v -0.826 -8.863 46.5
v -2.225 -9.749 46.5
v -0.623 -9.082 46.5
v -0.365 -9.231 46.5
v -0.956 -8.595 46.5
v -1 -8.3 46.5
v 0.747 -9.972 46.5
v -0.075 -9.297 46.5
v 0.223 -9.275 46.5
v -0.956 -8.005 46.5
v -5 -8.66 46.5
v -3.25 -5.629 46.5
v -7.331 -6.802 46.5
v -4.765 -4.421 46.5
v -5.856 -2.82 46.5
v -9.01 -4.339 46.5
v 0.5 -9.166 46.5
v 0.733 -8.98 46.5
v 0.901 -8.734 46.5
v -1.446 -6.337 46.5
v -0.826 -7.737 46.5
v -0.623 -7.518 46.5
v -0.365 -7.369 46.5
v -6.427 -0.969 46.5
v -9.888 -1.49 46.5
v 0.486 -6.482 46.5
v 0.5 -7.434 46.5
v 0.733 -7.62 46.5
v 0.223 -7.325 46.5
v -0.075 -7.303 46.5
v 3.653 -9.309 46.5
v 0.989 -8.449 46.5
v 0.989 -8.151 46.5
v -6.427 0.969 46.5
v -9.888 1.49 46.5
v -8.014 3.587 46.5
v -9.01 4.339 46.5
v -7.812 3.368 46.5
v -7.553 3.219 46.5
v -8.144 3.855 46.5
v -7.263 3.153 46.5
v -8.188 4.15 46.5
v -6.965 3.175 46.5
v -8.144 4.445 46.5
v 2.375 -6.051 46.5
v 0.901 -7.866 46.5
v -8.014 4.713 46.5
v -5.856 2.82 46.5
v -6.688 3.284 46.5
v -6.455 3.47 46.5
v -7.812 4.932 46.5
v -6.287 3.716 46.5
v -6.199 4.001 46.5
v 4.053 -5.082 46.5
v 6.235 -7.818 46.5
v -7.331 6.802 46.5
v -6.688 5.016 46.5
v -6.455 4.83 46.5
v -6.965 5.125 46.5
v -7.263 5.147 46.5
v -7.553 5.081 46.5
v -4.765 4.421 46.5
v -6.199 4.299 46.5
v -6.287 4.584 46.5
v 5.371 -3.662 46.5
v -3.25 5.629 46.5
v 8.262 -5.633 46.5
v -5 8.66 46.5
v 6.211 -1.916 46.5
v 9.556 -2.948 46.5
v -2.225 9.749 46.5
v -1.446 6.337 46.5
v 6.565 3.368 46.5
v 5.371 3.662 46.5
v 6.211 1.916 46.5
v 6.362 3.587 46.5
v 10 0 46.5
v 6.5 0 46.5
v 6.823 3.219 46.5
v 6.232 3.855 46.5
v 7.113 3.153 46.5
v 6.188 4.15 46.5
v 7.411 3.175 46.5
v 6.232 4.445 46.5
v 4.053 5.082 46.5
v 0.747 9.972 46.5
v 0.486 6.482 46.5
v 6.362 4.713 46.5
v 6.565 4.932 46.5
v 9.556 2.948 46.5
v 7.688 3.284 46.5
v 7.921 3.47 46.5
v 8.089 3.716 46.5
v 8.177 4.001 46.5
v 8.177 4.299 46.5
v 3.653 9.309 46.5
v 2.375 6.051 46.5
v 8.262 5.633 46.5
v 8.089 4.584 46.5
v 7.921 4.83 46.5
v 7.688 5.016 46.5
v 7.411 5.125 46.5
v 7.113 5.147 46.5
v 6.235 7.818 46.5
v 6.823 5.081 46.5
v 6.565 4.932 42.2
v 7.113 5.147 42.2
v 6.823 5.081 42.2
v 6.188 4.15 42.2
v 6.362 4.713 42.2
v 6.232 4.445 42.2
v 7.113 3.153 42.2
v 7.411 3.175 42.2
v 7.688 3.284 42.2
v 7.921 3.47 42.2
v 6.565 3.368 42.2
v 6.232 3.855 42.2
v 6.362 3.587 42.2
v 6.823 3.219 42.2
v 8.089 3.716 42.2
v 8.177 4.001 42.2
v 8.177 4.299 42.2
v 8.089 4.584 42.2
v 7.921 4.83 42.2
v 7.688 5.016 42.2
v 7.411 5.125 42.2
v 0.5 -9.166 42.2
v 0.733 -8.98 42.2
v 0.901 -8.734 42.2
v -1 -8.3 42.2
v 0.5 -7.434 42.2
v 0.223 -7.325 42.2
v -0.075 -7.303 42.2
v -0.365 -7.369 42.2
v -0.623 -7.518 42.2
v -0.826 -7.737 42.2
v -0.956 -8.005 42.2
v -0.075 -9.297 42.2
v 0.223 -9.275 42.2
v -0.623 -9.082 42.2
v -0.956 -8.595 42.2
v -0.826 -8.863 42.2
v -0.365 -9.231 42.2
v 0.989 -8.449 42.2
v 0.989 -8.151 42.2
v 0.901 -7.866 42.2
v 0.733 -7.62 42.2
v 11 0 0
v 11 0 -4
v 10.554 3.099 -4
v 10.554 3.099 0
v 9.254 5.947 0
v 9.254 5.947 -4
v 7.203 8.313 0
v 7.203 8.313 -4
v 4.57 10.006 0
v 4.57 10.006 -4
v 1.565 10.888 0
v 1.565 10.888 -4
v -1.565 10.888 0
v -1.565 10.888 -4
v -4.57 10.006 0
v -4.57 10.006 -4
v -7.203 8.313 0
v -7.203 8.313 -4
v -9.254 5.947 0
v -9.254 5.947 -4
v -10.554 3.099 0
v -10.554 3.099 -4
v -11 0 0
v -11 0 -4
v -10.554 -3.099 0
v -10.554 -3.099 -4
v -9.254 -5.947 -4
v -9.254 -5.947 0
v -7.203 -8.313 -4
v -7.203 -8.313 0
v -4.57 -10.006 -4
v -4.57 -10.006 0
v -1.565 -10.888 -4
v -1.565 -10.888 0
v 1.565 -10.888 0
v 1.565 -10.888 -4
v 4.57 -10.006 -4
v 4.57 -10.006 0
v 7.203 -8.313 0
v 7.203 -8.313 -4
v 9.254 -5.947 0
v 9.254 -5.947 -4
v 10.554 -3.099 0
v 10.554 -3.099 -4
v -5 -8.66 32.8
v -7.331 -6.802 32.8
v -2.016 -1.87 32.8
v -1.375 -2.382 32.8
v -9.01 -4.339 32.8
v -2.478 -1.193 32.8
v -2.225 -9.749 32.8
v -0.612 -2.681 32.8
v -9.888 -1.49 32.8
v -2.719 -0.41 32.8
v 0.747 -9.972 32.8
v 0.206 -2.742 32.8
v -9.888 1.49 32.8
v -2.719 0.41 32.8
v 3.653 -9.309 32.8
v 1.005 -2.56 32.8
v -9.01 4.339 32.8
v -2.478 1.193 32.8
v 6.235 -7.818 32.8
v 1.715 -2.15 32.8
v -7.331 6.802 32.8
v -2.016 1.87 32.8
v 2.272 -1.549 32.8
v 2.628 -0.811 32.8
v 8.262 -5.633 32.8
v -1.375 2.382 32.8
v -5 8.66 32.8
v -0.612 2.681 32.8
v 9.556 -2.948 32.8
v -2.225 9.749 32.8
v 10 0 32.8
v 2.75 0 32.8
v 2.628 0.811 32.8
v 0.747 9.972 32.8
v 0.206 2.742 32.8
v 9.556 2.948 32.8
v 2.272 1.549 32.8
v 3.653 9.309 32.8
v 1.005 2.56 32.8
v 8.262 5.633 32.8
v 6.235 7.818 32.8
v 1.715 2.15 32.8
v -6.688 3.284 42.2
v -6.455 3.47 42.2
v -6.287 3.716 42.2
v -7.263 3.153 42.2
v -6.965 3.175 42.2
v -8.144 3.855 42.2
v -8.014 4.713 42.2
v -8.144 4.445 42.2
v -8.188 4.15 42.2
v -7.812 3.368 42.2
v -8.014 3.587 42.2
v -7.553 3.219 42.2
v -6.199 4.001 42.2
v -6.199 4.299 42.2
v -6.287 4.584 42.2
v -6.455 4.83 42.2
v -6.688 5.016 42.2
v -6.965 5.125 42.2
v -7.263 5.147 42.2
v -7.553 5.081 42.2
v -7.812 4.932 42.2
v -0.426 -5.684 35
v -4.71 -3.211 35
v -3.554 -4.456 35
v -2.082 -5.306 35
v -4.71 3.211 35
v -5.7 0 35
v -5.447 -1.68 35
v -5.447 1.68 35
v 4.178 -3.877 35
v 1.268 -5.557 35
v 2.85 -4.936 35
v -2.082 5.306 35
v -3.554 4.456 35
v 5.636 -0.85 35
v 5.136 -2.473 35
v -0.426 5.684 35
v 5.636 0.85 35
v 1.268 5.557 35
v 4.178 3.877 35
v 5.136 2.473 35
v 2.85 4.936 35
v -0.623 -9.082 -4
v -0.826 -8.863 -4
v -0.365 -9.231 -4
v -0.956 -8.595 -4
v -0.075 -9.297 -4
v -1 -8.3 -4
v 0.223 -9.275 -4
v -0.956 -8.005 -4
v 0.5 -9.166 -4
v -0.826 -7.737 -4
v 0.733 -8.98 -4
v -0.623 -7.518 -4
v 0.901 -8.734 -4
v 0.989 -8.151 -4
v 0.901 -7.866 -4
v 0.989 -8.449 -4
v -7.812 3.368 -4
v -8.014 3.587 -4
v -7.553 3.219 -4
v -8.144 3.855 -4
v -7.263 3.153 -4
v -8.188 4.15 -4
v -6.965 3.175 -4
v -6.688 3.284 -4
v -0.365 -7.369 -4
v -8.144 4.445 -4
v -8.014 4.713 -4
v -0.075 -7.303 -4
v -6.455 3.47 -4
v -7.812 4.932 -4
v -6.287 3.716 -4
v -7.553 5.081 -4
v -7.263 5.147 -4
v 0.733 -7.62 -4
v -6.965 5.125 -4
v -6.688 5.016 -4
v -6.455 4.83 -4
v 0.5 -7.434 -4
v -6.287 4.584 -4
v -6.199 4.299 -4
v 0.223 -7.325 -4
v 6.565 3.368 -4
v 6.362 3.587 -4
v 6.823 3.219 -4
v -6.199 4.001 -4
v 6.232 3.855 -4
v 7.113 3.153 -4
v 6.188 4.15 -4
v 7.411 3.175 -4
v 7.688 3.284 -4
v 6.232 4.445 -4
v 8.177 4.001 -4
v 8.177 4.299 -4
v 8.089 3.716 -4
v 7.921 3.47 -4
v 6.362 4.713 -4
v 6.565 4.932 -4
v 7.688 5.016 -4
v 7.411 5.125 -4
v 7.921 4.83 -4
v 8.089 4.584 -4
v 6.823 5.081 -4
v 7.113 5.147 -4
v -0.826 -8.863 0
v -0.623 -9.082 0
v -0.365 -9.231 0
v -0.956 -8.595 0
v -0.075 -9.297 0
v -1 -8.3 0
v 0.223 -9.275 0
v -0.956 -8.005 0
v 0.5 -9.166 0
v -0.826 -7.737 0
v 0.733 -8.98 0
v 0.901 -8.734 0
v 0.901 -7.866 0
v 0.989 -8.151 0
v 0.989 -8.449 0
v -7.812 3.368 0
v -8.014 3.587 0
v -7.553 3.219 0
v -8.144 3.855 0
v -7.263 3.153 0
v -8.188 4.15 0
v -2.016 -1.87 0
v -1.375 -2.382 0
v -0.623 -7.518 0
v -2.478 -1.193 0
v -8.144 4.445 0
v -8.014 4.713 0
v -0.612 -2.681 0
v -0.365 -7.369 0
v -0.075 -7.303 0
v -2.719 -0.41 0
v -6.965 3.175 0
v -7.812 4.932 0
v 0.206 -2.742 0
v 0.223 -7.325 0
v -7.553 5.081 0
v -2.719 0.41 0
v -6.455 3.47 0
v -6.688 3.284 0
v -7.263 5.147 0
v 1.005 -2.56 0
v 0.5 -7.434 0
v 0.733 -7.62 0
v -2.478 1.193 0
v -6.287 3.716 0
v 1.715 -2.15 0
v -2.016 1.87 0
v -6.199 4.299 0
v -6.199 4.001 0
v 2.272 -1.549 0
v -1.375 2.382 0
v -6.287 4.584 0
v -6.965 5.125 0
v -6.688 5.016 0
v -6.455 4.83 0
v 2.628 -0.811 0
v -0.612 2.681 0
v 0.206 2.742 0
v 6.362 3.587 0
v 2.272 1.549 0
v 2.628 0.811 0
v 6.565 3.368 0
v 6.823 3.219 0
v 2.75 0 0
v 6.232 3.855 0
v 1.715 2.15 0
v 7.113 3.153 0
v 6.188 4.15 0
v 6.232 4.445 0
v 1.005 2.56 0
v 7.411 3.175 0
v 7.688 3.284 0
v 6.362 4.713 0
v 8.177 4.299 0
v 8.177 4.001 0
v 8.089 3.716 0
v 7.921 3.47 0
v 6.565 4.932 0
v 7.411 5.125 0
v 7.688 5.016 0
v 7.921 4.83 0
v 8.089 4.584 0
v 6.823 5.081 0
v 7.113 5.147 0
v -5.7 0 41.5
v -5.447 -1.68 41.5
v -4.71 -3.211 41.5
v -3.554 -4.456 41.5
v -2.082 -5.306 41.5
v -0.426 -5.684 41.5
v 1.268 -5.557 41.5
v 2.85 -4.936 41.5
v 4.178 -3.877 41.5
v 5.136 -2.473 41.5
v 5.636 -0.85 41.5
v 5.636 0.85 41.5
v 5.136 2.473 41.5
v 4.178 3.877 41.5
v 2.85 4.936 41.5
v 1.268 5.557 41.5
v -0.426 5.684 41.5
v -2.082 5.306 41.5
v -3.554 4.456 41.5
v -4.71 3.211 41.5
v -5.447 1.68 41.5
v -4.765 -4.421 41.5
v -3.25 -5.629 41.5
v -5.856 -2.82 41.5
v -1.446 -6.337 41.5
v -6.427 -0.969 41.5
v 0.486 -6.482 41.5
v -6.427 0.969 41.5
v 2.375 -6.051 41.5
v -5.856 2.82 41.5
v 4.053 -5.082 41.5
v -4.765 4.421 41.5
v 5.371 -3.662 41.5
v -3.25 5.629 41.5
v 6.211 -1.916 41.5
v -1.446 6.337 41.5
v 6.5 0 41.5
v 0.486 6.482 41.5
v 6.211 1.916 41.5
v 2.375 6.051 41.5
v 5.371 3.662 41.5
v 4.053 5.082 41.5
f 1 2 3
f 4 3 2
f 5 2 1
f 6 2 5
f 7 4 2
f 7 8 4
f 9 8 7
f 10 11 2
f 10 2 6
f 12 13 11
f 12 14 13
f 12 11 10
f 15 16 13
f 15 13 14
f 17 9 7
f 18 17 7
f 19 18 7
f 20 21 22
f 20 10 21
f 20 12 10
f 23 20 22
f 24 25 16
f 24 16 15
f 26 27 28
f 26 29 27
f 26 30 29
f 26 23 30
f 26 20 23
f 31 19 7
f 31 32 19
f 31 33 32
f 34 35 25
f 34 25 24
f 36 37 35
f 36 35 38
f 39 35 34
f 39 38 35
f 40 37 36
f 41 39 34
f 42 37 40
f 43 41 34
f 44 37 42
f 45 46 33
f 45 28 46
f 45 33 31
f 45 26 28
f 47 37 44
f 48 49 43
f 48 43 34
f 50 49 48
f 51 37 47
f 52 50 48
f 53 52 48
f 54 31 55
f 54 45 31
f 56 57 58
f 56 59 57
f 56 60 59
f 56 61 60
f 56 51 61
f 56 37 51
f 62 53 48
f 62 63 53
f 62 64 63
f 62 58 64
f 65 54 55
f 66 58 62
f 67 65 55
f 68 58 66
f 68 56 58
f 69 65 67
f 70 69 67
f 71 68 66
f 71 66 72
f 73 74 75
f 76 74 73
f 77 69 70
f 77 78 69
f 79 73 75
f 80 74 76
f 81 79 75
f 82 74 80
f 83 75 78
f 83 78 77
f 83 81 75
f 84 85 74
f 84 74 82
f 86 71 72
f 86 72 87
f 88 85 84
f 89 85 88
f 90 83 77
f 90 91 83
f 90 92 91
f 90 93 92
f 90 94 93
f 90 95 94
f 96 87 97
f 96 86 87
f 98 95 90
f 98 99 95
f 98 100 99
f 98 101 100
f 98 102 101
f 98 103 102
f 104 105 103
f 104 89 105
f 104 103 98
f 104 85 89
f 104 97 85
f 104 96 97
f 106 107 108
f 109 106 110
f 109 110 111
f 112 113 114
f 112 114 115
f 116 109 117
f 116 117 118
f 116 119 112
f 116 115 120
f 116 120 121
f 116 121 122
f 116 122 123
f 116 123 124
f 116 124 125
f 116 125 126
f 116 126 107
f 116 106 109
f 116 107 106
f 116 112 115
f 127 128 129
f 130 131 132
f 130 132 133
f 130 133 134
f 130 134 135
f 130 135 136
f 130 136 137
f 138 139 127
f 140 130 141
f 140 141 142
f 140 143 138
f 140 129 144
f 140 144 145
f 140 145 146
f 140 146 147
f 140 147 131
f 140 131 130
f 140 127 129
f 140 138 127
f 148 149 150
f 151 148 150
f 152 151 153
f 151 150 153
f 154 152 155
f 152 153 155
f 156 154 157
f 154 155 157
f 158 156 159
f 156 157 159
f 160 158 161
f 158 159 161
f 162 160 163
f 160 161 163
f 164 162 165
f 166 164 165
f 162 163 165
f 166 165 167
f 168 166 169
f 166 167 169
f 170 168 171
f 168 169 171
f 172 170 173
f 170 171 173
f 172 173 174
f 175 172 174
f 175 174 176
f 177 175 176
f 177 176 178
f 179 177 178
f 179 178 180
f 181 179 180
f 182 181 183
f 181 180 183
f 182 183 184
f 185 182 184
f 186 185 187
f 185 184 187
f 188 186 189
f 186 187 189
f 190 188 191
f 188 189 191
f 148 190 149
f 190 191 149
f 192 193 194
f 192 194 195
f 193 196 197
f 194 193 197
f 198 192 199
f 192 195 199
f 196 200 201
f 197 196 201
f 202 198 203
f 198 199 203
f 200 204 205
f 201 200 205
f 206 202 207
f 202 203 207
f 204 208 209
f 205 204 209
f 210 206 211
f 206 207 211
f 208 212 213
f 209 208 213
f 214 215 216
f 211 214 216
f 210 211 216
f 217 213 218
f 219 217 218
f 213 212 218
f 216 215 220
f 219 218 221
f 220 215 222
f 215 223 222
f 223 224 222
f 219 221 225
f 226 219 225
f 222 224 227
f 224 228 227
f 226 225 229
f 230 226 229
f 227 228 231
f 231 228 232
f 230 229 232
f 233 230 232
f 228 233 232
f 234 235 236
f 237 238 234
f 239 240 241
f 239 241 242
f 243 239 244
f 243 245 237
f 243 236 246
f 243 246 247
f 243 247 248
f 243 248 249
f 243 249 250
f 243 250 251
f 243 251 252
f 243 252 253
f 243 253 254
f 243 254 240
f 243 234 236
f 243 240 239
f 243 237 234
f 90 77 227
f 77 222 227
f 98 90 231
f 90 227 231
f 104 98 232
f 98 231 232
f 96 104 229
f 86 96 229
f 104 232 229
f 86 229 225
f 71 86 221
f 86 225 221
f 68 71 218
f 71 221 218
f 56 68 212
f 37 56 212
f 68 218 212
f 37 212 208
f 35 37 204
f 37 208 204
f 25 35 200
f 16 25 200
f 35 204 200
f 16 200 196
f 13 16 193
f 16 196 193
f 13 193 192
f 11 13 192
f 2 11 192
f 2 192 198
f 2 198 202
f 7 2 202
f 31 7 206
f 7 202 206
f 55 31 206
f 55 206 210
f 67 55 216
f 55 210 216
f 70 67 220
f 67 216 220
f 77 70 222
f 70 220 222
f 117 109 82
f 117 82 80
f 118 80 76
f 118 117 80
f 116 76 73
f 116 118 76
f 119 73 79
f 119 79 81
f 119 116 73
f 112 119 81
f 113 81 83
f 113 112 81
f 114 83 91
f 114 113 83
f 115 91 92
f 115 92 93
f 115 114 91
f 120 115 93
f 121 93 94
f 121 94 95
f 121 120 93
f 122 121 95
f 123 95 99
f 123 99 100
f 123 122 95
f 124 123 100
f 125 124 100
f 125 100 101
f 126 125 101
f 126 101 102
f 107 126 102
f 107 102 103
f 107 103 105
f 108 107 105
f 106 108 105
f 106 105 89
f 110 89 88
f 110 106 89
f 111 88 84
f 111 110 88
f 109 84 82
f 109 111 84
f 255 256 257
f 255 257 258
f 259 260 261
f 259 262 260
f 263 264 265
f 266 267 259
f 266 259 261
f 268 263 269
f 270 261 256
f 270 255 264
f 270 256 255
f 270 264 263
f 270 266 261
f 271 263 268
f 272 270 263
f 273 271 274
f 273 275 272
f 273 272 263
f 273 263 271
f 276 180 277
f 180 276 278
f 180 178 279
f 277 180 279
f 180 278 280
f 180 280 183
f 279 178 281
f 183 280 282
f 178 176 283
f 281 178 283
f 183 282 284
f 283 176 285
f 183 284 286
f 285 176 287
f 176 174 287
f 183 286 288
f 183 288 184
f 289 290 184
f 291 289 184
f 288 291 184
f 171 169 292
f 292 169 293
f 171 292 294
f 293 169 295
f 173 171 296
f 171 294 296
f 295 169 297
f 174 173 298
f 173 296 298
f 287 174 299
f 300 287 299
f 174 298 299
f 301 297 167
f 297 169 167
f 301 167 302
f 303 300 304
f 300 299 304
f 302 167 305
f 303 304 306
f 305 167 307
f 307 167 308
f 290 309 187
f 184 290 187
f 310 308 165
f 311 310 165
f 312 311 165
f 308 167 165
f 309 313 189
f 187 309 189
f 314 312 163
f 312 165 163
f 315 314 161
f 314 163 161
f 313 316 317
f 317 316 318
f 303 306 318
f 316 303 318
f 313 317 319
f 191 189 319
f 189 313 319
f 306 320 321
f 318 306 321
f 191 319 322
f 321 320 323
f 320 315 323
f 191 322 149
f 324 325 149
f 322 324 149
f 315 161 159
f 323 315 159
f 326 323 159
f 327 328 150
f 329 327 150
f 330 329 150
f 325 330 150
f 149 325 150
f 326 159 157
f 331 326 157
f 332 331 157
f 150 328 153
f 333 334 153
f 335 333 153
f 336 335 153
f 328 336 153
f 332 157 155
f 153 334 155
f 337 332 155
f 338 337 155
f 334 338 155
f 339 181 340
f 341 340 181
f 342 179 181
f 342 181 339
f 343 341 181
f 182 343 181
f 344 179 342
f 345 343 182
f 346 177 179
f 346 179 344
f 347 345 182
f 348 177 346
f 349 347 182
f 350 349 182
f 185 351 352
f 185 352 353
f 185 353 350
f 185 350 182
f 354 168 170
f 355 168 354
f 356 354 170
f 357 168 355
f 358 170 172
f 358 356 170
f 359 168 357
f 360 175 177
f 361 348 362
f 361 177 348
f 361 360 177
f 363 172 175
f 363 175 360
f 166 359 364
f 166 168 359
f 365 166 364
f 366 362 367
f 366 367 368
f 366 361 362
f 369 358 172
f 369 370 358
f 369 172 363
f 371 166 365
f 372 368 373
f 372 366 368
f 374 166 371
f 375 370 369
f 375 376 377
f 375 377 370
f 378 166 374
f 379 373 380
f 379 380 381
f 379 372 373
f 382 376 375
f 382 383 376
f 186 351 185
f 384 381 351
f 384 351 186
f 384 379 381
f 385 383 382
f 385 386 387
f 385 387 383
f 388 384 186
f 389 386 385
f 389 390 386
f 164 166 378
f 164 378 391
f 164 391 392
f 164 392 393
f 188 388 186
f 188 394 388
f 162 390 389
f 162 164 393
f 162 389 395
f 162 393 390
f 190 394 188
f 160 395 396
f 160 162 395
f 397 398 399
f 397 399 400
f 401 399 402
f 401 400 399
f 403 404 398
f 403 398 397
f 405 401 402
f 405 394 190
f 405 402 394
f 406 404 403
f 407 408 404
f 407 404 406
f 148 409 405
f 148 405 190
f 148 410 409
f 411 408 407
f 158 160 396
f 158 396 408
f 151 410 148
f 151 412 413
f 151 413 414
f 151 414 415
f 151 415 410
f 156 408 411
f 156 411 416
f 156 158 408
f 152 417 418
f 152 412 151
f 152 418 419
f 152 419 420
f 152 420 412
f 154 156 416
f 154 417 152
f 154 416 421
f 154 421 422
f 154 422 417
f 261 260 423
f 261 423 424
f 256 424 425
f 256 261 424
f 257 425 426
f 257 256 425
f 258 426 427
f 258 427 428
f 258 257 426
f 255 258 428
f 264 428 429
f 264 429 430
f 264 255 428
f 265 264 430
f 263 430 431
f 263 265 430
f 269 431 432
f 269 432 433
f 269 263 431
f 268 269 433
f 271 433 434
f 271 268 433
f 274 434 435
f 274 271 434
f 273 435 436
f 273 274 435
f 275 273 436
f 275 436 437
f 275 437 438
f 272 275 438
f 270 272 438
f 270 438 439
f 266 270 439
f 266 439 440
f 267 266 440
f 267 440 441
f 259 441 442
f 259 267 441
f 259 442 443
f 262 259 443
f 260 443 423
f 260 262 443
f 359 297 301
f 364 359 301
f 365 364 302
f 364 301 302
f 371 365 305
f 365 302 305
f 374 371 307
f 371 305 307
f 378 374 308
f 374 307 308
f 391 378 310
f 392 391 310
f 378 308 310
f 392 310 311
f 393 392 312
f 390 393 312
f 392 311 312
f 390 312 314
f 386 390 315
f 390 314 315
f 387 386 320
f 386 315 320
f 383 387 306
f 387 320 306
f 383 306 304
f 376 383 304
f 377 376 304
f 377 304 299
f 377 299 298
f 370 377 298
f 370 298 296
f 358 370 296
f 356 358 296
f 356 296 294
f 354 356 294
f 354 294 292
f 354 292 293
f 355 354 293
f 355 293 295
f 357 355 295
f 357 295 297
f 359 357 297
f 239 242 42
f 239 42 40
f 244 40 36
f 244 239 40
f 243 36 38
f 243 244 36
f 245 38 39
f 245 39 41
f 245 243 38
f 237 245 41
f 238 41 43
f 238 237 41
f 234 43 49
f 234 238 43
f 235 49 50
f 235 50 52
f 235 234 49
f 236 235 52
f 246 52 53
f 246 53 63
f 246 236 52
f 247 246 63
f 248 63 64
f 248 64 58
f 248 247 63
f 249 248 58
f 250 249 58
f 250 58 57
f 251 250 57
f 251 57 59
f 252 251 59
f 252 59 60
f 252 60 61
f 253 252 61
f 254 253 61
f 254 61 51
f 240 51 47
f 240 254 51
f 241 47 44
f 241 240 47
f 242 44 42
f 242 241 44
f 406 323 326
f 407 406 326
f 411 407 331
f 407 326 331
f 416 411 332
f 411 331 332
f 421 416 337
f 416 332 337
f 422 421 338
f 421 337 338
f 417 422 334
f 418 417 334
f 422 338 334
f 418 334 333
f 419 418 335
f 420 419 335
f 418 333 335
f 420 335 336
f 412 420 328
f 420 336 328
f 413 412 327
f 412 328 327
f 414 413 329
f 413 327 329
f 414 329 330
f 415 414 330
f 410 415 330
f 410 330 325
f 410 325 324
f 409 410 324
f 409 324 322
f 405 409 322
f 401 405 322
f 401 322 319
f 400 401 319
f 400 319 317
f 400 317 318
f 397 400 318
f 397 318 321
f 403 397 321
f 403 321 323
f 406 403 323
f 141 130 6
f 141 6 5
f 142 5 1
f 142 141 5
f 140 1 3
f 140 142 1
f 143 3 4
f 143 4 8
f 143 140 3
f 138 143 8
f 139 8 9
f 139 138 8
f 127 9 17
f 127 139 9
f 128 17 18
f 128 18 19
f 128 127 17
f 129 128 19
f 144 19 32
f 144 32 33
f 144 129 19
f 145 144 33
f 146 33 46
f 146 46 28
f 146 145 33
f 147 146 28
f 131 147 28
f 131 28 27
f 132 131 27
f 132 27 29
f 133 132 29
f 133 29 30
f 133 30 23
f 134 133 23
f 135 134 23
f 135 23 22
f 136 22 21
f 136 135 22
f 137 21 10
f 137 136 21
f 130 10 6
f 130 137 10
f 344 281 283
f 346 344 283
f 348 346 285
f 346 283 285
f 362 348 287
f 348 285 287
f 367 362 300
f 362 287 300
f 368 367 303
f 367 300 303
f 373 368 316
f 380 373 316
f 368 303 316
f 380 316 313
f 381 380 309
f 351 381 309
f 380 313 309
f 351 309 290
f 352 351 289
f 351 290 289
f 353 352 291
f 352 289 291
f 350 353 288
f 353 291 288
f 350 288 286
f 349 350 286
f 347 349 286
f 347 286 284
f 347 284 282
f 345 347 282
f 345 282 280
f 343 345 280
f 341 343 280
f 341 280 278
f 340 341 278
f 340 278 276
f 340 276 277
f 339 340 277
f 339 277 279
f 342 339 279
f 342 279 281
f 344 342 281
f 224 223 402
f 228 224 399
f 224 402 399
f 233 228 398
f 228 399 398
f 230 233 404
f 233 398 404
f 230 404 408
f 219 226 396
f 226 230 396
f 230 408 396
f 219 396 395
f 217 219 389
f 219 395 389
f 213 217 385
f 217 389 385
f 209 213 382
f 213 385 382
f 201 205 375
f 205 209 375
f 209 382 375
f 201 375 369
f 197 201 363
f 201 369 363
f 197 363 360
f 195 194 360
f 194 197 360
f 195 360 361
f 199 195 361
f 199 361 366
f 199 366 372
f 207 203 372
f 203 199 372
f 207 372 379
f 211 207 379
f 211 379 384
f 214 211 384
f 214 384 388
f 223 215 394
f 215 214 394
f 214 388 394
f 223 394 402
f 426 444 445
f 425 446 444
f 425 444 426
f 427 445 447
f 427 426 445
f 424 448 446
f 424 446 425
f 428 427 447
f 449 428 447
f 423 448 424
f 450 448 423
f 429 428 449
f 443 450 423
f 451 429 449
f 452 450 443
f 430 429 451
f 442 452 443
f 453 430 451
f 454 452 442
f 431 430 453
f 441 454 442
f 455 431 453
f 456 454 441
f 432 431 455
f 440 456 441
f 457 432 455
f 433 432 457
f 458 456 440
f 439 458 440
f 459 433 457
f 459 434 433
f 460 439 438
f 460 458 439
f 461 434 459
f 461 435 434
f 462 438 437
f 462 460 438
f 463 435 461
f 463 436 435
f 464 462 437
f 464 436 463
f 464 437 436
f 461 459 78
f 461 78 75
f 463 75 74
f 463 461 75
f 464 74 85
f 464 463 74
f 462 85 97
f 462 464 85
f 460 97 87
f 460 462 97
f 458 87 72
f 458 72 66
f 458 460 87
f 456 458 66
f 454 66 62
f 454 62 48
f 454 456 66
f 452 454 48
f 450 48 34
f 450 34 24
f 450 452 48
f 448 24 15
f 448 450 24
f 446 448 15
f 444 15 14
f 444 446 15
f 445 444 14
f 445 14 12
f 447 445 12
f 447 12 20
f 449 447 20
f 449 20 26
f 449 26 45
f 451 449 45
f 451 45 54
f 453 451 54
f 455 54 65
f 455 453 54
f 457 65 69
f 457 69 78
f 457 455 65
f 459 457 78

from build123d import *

# Parameters (mm, degrees)
MOUNTING_FLANGE_START                          = -4
SKETCH1_R                                      = 11
MOUNTING_FLANGE_DEPTH                          = 4
SKETCH2_R                                      = 2.75
D5P5_CENTRAL_POST_DEPTH                        = 32.81
CLOSED_FLOOR_BELOW_SHAFT_NOSE_START            = 32.8
SKETCH3_R                                      = 10
CLOSED_FLOOR_BELOW_SHAFT_NOSE_DEPTH            = 2.2
SHAFT_AND_CLIP_CLEARANCE_START                 = 35
SKETCH4_R                                      = 10
SKETCH4_R_2                                    = 5.7
SHAFT_AND_CLIP_CLEARANCE_DEPTH                 = 6.5
LOWER_686ZZ_SEAT_START                         = 41.5
SKETCH5_R                                      = 10
SKETCH5_R_2                                    = 6.5
LOWER_686ZZ_SEAT_DEPTH                         = 5
SKETCH6_R                                      = 1
BASE_THREE_M2_THROUGH_THREAD_MAJOR_ENVEL_DEPTH = 4.01
TOP_CAP_THREE_M2_BLIND_THREAD_MAJOR_ENVE_START = -4.3
SKETCH7_R                                      = 1
TOP_CAP_THREE_M2_BLIND_THREAD_MAJOR_ENVE_DEPTH = 4.3


with BuildPart() as part:
    # Sketch1 → Mounting_Flange (new body)
    with BuildSketch(Plane.XY.offset(MOUNTING_FLANGE_START)):
        Circle(SKETCH1_R)
    extrude(amount=MOUNTING_FLANGE_DEPTH)

    # Sketch2 → D5p5_Central_Post (add)
    with BuildSketch(Plane.XY):
        Circle(SKETCH2_R)
    extrude(amount=D5P5_CENTRAL_POST_DEPTH)

    # Sketch3 → Closed_Floor_Below_Shaft_Nose (add)
    with BuildSketch(Plane.XY.offset(CLOSED_FLOOR_BELOW_SHAFT_NOSE_START)):
        Circle(SKETCH3_R)
    extrude(amount=CLOSED_FLOOR_BELOW_SHAFT_NOSE_DEPTH)

    # Sketch4 → Shaft_And_Clip_Clearance (add)
    with BuildSketch(Plane.XY.offset(SHAFT_AND_CLIP_CLEARANCE_START)):
        Circle(SKETCH4_R)
        with Locations(Location((0, 0, 0), (0, 0, 180))):
            Circle(SKETCH4_R_2, mode=Mode.SUBTRACT)
    extrude(amount=SHAFT_AND_CLIP_CLEARANCE_DEPTH)

    # Sketch5 → Lower_686ZZ_Seat (add)
    with BuildSketch(Plane.XY.offset(LOWER_686ZZ_SEAT_START)):
        Circle(SKETCH5_R)
        Circle(SKETCH5_R_2, mode=Mode.SUBTRACT)
    extrude(amount=LOWER_686ZZ_SEAT_DEPTH)

    # Sketch6 → Base_Three_M2_Through_Thread_Major_Envelopes (cut)
    with BuildSketch(Plane(origin=(0, 0, -4), x_dir=(-1, 0, 0), z_dir=(0, 0, -1))):
        with Locations((-7.188010851, 4.15)):
            Circle(SKETCH6_R)
        with Locations((7.188010851, 4.15)):
            Circle(SKETCH6_R)
        with Locations((0, -8.3)):
            Circle(SKETCH6_R)
    extrude(amount=-BASE_THREE_M2_THROUGH_THREAD_MAJOR_ENVEL_DEPTH, mode=Mode.SUBTRACT)

    # Sketch7 → Top_Cap_Three_M2_Blind_Thread_Major_Envelopes (cut)
    with BuildSketch(Plane.XY.offset(46.5).offset(TOP_CAP_THREE_M2_BLIND_THREAD_MAJOR_ENVE_START)):
        with Locations(Location((7.188010851, 4.15, 0), (0, 0, 180))):
            Circle(SKETCH7_R)
        with Locations(Location((-7.188010851, 4.15, 0), (0, 0, 180))):
            Circle(SKETCH7_R)
        with Locations(Location((0, -8.3, 0), (0, 0, 180))):
            Circle(SKETCH7_R)
    extrude(amount=TOP_CAP_THREE_M2_BLIND_THREAD_MAJOR_ENVE_DEPTH, mode=Mode.SUBTRACT)


solid = part.part
